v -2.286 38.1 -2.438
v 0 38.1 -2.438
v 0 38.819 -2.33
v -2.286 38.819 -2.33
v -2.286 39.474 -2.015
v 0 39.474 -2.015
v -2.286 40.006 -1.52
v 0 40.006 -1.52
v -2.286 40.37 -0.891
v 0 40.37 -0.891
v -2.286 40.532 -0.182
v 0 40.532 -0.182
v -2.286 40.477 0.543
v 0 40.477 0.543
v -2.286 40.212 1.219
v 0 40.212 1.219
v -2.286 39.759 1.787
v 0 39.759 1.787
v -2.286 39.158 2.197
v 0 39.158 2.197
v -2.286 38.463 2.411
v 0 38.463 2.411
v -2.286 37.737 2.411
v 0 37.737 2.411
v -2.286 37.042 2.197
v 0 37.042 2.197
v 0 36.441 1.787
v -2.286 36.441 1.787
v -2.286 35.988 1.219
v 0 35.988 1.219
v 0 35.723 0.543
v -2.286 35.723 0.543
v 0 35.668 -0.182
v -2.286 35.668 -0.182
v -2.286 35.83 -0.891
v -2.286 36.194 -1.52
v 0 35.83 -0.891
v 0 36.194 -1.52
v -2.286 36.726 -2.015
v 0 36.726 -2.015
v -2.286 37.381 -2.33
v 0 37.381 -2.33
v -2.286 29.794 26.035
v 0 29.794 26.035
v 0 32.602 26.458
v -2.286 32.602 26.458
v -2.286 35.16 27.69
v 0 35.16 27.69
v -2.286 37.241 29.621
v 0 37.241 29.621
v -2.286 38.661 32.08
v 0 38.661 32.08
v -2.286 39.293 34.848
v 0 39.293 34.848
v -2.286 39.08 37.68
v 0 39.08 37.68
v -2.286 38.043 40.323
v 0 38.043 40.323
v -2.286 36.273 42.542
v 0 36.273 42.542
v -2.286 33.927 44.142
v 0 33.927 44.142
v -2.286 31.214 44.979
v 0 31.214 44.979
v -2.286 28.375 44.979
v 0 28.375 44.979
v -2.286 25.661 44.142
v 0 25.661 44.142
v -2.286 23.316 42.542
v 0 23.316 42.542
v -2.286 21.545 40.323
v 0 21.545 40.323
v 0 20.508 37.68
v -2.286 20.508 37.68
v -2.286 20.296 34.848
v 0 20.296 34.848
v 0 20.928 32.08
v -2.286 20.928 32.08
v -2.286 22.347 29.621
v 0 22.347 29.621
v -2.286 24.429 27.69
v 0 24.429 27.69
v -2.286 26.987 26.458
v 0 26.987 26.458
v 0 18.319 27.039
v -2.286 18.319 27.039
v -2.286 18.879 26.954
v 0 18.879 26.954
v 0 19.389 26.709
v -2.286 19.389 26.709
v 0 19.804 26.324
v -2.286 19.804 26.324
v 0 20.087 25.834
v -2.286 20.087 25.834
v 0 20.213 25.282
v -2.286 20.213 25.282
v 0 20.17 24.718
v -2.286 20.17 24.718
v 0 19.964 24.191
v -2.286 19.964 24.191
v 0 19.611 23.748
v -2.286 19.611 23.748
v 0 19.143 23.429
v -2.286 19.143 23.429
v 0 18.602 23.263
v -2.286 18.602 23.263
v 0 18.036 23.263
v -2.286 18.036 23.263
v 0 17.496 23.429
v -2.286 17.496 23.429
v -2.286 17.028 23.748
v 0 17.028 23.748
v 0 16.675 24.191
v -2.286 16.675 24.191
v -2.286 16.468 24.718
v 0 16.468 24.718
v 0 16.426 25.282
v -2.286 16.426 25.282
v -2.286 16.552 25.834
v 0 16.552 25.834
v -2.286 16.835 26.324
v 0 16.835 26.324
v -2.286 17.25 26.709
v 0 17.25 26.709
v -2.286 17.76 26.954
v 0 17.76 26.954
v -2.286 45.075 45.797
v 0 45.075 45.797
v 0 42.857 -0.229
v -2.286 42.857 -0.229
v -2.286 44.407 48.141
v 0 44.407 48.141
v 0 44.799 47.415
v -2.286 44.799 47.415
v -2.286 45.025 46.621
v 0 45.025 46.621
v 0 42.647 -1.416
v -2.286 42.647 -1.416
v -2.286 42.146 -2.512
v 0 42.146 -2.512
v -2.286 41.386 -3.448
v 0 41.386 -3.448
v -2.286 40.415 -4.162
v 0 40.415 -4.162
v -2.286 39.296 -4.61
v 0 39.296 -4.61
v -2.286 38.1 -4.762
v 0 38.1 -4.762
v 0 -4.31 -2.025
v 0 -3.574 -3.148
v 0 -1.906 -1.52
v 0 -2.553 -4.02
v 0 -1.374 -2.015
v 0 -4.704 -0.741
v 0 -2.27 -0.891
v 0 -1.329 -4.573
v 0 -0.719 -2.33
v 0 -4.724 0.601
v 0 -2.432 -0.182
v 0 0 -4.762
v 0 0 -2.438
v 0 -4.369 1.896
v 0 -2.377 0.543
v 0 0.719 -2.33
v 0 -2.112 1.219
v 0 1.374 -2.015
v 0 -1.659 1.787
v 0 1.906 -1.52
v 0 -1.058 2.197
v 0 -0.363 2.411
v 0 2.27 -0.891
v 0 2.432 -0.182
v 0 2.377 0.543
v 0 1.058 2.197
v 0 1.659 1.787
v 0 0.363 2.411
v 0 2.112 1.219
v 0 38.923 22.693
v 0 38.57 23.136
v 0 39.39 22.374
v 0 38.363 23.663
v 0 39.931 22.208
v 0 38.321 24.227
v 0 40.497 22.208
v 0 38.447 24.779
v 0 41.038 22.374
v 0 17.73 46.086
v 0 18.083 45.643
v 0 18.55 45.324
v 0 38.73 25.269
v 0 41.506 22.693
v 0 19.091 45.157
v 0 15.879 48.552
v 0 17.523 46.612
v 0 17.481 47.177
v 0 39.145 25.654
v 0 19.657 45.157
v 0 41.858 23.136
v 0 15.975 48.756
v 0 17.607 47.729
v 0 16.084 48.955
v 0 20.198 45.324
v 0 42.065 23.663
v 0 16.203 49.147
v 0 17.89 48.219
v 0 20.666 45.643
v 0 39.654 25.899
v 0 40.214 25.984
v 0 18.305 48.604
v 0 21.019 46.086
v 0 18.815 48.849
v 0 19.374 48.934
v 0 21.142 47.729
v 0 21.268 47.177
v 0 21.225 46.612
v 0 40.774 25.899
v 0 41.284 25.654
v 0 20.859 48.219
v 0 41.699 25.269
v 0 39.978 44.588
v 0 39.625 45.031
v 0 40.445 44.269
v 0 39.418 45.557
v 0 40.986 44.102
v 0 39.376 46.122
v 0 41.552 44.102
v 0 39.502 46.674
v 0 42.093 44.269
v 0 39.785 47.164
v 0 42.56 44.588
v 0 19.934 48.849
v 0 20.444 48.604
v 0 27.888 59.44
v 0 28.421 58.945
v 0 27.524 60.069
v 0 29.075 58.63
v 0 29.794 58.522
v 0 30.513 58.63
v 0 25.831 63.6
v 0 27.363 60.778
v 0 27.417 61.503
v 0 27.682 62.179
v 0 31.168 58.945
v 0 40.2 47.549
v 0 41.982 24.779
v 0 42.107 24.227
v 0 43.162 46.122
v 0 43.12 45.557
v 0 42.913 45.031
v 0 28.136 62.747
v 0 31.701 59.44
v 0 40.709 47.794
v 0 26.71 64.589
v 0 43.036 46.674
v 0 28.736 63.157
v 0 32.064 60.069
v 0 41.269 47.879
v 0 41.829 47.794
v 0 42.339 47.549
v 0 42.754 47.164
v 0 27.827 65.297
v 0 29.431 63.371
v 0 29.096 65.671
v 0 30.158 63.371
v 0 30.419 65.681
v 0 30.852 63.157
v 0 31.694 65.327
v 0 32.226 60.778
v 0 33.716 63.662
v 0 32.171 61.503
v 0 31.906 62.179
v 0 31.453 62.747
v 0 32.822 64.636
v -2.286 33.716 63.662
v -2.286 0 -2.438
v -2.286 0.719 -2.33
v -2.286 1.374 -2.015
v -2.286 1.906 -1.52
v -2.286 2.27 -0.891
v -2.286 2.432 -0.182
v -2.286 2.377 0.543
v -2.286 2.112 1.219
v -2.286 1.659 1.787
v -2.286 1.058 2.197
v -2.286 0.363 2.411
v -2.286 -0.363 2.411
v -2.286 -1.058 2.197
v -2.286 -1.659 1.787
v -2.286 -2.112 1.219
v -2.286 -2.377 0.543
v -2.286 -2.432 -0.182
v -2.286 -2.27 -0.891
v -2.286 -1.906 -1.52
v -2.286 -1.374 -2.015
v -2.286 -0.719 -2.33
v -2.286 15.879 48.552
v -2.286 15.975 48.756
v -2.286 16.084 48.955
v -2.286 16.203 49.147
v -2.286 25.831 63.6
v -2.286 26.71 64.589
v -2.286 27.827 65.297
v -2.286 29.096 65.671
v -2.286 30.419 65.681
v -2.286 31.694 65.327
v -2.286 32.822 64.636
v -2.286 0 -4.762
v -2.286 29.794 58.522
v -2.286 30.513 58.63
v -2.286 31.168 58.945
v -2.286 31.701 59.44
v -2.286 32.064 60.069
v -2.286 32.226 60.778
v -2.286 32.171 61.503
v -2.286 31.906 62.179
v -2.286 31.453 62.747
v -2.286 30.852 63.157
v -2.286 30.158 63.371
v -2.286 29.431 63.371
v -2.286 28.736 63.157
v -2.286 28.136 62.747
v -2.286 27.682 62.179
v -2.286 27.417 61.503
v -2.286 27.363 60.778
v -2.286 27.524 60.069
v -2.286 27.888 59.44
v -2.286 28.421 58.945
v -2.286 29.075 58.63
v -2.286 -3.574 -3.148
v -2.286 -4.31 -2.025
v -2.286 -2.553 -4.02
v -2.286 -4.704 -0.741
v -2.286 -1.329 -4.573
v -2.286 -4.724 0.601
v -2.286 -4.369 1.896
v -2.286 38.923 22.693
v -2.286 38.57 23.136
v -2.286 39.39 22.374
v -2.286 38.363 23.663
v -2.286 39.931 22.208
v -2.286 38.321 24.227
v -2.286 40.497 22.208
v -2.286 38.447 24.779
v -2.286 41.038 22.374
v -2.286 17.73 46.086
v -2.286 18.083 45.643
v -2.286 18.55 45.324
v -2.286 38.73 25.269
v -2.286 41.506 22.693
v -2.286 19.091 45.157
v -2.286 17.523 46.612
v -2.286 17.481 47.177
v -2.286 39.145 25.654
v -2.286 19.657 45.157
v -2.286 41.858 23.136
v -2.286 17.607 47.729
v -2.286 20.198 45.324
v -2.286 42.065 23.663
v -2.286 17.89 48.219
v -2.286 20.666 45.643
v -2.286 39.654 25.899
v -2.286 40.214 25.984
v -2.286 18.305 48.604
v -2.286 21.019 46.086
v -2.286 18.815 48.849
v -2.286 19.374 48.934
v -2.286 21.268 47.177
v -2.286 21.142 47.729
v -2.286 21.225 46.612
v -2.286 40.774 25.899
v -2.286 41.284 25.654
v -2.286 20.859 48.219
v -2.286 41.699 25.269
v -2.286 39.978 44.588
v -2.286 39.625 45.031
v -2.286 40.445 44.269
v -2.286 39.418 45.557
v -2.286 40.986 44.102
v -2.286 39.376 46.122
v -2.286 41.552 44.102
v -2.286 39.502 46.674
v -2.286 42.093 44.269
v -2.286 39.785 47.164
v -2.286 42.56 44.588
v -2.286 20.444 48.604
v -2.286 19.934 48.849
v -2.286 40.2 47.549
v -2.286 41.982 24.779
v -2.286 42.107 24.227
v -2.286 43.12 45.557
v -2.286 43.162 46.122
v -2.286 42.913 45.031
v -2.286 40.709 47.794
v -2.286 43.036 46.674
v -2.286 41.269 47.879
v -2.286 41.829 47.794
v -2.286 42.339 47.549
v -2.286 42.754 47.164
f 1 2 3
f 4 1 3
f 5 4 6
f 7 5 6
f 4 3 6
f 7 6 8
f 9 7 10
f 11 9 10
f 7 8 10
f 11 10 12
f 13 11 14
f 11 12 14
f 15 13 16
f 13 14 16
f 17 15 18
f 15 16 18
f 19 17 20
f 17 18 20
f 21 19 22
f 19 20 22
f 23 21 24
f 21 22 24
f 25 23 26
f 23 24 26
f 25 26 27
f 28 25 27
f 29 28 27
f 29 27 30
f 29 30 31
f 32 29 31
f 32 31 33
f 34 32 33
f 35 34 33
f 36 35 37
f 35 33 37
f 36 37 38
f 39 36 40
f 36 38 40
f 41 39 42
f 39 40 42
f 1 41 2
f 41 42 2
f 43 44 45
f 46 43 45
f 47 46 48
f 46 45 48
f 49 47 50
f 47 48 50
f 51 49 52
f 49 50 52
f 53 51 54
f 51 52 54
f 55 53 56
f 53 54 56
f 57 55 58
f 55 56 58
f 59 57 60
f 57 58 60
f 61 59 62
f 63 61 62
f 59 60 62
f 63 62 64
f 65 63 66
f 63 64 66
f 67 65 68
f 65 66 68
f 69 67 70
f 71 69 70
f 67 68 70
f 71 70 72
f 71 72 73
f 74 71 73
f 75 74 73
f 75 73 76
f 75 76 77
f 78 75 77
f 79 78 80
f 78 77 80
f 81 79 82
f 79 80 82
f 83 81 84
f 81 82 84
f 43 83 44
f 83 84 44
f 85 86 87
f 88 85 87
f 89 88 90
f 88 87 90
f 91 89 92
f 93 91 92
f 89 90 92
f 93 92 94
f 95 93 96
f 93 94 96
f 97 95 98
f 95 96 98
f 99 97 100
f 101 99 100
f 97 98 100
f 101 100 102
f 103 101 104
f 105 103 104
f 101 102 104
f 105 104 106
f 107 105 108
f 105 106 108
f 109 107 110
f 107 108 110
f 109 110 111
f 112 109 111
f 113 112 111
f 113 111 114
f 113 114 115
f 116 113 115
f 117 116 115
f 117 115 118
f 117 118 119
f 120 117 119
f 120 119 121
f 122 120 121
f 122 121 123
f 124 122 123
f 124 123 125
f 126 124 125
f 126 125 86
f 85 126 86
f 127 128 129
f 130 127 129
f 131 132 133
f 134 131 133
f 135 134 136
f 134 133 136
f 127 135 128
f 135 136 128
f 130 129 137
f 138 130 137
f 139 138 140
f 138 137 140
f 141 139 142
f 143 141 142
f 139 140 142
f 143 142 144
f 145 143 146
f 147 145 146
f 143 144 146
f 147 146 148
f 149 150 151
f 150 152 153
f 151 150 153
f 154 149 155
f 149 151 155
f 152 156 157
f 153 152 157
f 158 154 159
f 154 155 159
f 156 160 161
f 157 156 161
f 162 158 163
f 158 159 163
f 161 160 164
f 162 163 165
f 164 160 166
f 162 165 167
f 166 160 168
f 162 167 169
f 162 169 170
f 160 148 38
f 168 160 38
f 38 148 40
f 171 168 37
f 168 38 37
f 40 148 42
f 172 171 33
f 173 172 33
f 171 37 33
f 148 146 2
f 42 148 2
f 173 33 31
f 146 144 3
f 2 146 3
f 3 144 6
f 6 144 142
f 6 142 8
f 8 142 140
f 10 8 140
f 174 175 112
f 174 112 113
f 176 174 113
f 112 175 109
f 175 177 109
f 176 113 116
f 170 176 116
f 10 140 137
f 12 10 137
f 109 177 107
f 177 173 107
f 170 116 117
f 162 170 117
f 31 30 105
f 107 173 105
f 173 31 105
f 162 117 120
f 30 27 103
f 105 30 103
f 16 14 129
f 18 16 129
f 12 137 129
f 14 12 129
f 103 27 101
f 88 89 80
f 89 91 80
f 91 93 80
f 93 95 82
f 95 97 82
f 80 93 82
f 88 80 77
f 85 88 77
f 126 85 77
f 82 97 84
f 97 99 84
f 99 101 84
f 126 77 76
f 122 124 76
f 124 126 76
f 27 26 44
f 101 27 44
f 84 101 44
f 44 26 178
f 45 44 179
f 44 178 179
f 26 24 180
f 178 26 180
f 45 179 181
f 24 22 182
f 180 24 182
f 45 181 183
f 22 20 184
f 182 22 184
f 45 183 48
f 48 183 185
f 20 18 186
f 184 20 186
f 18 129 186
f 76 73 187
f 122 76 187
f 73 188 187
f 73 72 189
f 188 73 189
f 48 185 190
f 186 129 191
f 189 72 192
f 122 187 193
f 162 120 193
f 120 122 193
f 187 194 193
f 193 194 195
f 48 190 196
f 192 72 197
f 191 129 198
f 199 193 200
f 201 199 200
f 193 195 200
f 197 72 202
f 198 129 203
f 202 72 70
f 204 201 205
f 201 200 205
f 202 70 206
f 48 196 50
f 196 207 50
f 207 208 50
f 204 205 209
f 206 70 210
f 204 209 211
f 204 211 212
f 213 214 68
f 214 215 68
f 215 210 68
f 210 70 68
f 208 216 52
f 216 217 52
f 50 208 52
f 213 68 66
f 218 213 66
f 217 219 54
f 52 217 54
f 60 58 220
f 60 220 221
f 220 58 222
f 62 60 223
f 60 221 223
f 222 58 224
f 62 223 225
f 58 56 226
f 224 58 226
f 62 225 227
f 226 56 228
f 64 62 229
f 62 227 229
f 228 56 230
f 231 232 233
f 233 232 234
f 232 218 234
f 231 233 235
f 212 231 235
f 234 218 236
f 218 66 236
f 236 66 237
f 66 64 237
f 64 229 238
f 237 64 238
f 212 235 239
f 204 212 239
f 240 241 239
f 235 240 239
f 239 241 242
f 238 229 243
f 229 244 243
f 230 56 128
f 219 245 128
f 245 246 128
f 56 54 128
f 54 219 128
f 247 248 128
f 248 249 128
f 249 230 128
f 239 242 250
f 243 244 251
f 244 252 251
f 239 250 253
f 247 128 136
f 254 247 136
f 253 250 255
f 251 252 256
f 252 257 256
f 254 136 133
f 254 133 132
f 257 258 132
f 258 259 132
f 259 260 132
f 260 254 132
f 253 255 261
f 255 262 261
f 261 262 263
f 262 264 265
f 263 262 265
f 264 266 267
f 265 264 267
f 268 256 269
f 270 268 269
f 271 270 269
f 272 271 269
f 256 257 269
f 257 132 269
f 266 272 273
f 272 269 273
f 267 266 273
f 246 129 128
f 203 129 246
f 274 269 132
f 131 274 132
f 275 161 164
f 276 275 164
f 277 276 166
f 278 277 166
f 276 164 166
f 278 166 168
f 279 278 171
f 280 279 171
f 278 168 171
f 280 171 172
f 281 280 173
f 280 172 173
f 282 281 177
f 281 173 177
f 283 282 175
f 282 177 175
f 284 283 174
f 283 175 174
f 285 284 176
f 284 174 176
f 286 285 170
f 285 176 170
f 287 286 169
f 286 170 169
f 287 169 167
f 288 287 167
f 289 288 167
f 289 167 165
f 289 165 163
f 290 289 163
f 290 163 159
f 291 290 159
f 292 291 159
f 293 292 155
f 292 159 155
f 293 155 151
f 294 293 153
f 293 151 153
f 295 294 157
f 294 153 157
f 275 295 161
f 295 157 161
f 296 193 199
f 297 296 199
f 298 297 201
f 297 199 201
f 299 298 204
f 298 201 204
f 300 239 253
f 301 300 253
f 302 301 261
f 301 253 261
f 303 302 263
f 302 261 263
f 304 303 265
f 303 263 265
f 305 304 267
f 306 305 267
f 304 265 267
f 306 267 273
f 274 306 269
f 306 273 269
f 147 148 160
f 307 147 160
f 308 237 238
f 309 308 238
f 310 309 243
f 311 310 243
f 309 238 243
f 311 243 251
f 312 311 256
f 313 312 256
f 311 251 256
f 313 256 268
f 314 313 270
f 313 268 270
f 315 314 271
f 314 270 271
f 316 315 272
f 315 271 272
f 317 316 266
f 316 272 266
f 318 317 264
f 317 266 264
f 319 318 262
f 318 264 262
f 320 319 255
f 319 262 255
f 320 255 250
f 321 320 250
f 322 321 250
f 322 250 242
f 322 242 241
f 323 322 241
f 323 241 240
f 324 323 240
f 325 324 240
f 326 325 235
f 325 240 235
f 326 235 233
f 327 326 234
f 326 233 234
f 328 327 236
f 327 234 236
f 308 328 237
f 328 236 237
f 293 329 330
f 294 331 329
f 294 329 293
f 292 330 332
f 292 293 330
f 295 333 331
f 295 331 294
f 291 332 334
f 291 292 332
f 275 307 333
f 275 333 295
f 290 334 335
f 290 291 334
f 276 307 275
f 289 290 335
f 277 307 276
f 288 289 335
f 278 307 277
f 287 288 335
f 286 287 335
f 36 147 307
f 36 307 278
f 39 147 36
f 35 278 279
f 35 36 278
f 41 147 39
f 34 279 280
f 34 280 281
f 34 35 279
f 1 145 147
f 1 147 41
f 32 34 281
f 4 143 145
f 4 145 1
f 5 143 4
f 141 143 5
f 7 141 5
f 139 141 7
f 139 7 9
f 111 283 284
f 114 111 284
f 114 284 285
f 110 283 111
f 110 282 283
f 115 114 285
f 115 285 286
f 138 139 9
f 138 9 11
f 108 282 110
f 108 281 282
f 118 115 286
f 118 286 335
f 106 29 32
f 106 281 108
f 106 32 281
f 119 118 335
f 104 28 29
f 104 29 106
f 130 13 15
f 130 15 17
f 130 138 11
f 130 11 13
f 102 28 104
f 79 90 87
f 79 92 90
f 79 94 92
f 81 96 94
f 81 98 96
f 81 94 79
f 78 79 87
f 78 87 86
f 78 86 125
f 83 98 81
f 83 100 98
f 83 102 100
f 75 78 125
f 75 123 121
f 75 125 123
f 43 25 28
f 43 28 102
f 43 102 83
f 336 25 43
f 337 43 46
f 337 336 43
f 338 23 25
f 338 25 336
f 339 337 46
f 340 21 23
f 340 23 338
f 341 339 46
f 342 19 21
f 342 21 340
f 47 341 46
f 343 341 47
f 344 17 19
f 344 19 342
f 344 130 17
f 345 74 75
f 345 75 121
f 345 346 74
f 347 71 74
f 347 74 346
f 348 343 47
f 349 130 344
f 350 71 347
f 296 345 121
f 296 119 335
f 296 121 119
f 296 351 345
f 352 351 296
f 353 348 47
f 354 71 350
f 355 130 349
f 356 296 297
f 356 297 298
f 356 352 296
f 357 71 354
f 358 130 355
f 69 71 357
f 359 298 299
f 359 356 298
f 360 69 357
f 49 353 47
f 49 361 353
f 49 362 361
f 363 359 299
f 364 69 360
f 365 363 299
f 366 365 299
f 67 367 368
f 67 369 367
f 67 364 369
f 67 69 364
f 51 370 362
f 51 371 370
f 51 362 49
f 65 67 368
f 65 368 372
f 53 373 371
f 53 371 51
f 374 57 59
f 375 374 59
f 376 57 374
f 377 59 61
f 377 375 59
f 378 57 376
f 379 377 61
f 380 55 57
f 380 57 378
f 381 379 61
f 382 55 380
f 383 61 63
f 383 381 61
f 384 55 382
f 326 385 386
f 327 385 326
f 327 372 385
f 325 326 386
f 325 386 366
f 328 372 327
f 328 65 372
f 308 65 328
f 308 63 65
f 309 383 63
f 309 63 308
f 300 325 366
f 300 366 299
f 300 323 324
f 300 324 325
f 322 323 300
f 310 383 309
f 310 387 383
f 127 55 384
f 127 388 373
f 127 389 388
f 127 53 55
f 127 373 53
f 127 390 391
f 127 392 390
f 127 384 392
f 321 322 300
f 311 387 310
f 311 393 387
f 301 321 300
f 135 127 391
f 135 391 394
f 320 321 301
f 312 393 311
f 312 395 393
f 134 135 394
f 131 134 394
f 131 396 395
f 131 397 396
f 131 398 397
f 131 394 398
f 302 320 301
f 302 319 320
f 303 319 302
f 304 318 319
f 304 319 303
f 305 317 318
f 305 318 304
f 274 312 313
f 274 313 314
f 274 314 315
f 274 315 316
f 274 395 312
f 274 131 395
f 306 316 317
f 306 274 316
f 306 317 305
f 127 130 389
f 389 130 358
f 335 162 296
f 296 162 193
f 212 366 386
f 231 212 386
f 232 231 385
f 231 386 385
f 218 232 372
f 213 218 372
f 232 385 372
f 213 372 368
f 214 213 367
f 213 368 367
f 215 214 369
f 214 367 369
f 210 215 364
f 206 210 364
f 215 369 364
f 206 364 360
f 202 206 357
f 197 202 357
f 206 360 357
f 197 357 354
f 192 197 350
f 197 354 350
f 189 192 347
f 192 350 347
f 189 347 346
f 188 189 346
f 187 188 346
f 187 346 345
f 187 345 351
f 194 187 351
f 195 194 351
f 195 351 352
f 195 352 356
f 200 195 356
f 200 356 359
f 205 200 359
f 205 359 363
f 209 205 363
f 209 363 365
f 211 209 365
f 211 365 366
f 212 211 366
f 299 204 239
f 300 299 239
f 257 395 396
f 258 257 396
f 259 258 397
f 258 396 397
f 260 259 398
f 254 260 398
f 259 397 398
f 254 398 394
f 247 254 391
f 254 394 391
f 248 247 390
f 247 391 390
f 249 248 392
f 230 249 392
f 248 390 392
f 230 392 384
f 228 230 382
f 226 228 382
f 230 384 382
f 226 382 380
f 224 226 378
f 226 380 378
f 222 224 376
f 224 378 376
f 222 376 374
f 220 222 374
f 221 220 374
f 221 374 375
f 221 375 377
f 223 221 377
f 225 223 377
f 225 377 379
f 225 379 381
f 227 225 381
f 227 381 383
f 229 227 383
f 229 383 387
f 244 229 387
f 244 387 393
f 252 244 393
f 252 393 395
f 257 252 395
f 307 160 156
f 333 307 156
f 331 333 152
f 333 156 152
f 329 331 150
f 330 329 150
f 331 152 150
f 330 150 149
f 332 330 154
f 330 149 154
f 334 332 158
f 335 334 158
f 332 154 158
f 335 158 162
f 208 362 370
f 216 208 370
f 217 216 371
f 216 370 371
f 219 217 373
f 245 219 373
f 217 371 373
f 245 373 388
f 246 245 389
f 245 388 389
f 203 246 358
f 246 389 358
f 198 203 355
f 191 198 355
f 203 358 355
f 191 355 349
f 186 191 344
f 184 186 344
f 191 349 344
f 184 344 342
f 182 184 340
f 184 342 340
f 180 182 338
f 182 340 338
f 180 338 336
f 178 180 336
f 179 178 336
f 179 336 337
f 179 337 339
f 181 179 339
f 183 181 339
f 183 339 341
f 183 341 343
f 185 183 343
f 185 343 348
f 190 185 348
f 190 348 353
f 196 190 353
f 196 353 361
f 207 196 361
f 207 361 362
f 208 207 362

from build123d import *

# Parameters (mm, degrees)
SKETCH1_R             = 2.4384
SKETCH1_R_2           = 9.525
BASE_FLANGE1_DEPTH    = 2.286
F_6_CLEARANCE_HOLE1_D = 3.7973


# Sheet-metal steps are written as plain solids
with BuildPart() as part:
    # Sketch1 → Base-Flange1 (new body)
    with BuildSketch(Plane(origin=(0, 0, 0), x_dir=(0, 0, -1), z_dir=(1, 0, 0))):
        with BuildLine():
            Line((4.7625, 38.1), (4.7625, 0))
            ThreePointArc((4.7625, 0), (2.61262586, -3.981908131), (-1.896016479, -4.368813084))
            Line((-1.896016479, -4.368813084), (-48.551698058, 15.879235852))
            ThreePointArc((-48.551698058, 15.879235852), (-48.856590074, 16.028021212), (-49.147038032, 16.203338662))
            Line((-49.147038032, 16.203338662), (-63.600191446, 25.830515429))
            ThreePointArc((-63.600191446, 25.830515429), (-65.722355809, 29.757140553), (-63.661556753, 33.716316439))
            Line((-63.661556753, 33.716316439), (-48.141159083, 44.406778026))
            ThreePointArc((-48.141159083, 44.406778026), (-47.023714737, 44.933314584), (-45.796546729, 45.074669792))
            Line((-45.796546729, 45.074669792), (0.229208689, 42.856981146))
            ThreePointArc((0.229208689, 42.856981146), (3.447681296, 41.385559303), (4.7625, 38.1))
        make_face()
        with Locations((0, 38.1)):
            Circle(SKETCH1_R, mode=Mode.SUBTRACT)
        Circle(SKETCH1_R, mode=Mode.SUBTRACT)
        with Locations((-60.96, 29.7942)):
            Circle(SKETCH1_R, mode=Mode.SUBTRACT)
        with Locations((-35.56, 29.7942)):
            Circle(SKETCH1_R_2, mode=Mode.SUBTRACT)
    extrude(amount=-BASE_FLANGE1_DEPTH)

    # #6 Clearance Hole1 (through all)
    with Locations(Plane(origin=(0, 0, 0), x_dir=(0, 0, -1), z_dir=(1, 0, 0))):
        with Locations((-24.085115125, 40.214113681), (-45.979913681, 41.269084875), (-25.140086319, 18.319315125), (-47.034884875, 19.374286319)):
            Hole(F_6_CLEARANCE_HOLE1_D / 2)


solid = part.part
